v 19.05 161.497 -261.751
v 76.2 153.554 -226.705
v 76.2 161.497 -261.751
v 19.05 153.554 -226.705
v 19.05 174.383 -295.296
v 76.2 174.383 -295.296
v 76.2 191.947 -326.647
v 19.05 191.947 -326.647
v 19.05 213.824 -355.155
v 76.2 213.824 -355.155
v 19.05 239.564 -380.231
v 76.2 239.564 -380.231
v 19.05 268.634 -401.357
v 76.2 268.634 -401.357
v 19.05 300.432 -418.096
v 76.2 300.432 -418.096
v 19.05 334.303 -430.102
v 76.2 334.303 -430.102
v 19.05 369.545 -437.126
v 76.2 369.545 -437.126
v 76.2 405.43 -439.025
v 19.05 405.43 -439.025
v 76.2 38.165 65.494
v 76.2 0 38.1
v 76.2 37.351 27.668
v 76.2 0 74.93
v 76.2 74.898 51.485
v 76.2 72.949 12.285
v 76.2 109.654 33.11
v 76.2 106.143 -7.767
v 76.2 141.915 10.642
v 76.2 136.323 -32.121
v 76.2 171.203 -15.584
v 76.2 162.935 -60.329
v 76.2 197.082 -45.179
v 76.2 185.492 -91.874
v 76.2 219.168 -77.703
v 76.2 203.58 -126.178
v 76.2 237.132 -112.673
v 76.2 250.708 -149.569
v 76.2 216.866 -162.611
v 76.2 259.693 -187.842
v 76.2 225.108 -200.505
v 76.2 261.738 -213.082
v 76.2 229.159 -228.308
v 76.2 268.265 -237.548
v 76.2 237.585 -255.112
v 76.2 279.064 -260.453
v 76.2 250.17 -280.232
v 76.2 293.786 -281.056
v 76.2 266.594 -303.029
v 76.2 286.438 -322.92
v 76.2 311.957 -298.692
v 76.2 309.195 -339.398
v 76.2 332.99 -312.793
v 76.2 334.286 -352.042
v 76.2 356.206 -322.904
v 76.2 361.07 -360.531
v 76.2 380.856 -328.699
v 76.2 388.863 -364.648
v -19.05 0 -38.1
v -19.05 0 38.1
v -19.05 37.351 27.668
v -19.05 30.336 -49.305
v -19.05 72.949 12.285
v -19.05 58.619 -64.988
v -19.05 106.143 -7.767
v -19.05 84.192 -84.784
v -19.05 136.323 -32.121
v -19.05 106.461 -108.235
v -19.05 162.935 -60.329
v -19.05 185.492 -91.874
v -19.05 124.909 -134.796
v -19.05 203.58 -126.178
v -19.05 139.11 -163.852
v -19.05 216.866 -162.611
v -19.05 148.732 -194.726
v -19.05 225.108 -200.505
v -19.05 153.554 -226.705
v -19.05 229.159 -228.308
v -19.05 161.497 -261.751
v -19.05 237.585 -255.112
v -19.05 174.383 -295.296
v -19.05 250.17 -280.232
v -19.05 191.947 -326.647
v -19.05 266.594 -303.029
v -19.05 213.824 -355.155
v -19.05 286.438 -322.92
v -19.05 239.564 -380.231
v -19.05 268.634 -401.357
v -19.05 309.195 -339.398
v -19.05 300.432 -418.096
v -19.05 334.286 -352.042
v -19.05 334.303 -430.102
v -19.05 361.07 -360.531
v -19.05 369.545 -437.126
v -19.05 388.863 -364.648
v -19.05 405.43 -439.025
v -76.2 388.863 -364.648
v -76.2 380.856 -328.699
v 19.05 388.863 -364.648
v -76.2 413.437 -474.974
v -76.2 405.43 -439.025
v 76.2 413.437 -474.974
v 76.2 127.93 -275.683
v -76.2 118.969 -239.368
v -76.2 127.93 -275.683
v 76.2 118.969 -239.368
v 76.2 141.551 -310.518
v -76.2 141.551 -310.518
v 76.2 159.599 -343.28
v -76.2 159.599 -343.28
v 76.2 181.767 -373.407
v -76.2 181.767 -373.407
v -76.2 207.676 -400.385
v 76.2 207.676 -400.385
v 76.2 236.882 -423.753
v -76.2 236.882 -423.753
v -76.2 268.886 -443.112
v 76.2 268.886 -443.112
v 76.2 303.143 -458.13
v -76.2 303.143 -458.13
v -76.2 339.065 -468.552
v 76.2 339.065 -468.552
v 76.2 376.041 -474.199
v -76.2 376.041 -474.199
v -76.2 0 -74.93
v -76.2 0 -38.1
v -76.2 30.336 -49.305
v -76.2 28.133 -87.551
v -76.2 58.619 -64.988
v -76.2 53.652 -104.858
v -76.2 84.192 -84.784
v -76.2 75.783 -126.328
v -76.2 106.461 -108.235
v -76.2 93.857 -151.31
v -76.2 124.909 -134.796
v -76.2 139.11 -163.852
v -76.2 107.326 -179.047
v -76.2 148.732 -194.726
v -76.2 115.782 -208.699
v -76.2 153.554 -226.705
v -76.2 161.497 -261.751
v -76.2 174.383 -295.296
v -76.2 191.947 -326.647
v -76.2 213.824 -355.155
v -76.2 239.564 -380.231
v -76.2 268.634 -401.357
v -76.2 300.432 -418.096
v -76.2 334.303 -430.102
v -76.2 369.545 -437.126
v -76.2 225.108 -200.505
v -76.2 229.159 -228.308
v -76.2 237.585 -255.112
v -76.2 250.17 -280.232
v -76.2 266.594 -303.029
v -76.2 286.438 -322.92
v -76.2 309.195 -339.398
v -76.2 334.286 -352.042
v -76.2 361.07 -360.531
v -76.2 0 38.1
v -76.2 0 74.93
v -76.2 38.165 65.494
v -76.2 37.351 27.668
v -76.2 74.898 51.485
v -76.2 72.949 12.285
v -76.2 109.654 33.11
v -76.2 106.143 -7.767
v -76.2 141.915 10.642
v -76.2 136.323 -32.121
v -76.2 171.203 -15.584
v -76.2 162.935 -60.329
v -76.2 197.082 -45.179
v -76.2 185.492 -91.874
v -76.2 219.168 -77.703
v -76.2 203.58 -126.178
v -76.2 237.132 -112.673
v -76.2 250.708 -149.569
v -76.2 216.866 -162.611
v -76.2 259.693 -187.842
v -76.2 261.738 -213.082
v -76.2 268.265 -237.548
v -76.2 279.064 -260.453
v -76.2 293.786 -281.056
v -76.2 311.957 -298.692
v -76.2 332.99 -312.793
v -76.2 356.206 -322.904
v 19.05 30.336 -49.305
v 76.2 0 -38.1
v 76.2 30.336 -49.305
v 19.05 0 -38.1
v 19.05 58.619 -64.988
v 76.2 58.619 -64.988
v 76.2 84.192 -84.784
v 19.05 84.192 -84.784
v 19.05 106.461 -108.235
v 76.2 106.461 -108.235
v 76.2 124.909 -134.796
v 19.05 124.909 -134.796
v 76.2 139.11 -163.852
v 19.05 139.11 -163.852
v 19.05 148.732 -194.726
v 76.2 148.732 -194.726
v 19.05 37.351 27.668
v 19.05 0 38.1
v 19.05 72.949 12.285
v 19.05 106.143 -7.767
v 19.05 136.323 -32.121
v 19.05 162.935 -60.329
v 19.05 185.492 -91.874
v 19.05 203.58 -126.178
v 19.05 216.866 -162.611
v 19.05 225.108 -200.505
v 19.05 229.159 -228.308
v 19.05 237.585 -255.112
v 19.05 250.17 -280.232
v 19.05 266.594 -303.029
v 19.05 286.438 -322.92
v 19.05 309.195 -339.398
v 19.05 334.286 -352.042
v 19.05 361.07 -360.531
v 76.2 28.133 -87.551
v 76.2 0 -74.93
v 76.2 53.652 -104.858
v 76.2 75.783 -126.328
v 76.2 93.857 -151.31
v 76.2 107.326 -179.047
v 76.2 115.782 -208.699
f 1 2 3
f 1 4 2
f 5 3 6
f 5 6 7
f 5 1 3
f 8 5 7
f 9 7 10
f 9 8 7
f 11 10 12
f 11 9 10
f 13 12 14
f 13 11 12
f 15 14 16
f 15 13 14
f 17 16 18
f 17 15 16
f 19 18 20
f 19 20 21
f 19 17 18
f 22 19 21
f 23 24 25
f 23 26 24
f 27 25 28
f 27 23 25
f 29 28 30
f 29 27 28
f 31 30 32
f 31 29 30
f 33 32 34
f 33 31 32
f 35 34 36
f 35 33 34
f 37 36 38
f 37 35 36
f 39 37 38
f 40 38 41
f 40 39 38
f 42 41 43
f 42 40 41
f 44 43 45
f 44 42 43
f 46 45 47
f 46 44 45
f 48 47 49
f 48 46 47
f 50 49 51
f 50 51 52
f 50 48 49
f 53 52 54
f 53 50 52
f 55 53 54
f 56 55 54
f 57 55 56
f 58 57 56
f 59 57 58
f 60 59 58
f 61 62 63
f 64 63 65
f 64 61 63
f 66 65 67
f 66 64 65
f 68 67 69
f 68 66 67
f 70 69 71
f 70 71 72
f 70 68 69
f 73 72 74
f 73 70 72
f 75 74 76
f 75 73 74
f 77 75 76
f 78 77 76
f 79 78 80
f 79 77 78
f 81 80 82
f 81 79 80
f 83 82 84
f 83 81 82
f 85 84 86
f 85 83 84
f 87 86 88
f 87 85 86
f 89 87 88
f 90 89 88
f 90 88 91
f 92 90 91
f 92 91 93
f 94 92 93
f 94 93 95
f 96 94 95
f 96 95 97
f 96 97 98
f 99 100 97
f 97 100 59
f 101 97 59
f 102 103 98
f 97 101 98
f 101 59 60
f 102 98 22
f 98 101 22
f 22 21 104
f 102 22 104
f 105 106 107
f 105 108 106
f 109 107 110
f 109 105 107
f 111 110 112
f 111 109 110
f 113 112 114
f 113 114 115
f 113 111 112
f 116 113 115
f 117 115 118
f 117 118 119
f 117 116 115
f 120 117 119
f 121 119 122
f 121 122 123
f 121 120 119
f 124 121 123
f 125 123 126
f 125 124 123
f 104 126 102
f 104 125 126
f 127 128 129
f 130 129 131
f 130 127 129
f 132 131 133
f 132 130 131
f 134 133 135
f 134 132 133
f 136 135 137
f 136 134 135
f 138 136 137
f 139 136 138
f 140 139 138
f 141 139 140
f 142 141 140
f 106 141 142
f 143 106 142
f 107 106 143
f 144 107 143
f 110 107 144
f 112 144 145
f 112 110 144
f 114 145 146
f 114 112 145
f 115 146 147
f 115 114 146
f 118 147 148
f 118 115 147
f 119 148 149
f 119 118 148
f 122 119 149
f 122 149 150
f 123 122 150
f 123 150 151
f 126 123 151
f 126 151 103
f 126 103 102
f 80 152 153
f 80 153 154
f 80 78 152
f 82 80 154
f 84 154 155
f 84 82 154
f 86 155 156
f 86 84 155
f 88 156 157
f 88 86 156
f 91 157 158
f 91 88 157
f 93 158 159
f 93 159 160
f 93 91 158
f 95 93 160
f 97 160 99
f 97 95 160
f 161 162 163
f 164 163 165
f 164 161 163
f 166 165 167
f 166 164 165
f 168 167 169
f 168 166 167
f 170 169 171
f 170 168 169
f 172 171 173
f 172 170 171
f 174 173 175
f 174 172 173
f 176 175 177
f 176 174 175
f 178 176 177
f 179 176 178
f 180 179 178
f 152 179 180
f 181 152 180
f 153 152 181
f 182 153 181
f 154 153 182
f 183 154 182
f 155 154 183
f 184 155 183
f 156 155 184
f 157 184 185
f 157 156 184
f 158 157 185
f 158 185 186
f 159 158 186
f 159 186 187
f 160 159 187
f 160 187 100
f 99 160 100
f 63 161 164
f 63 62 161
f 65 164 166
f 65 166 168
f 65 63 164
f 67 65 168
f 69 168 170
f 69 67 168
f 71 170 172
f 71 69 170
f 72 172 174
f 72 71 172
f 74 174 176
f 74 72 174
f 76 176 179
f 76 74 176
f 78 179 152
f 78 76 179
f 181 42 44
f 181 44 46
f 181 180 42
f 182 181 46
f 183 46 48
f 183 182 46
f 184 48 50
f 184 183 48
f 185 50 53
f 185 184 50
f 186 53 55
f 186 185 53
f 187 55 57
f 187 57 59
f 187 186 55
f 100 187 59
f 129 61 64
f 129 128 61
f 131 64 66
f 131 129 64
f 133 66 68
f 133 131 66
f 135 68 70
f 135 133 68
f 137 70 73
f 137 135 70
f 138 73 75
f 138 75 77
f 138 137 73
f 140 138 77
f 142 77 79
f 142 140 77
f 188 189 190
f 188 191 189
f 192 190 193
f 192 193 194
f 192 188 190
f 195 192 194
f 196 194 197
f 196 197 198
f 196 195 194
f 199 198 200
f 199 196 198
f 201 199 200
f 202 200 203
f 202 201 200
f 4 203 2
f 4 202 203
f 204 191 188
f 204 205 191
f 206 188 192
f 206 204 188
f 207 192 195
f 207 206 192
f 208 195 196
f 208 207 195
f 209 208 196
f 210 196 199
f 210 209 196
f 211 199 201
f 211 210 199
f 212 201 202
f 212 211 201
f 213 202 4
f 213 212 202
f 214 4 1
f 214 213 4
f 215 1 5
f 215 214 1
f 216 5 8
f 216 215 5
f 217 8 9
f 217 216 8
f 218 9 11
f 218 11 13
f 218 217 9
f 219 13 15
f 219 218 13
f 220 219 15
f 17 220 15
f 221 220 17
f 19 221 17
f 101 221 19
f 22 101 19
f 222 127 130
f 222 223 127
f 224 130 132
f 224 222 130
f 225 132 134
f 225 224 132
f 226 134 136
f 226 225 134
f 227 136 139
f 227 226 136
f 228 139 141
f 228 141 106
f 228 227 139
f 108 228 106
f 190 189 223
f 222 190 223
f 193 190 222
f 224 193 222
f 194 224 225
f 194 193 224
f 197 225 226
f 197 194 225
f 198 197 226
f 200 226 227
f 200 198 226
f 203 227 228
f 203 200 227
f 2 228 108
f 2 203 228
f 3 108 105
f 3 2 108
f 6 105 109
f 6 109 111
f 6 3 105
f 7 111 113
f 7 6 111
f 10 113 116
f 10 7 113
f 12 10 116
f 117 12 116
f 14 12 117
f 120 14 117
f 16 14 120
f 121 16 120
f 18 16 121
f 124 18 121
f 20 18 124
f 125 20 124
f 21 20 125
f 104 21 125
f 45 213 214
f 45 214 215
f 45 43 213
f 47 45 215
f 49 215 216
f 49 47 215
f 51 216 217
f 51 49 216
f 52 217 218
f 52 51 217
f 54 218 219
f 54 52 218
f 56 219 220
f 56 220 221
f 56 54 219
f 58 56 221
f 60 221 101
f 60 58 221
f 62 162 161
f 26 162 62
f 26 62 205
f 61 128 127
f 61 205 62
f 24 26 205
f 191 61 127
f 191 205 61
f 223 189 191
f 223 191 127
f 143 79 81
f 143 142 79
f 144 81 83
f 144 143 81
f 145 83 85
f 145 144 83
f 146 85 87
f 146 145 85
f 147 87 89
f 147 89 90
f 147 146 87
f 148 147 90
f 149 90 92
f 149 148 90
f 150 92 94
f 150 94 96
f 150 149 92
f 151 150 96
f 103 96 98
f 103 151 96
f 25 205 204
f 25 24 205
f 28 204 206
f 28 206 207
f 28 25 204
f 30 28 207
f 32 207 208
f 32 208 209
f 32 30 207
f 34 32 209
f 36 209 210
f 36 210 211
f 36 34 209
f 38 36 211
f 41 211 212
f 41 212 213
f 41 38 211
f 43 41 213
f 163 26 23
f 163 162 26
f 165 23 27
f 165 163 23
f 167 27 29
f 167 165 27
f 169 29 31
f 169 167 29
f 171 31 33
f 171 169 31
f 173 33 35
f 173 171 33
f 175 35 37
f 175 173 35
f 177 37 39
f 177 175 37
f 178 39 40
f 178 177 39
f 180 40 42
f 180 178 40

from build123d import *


with BuildPart() as f2:
    # F2: sweep along a path in F1
    with BuildLine(Plane.YZ) as f2_path:
        ThreePointArc((0, 0), (128.283823392, -77.0044991359), (189.3310906342, -213.6048775888))
        ThreePointArc((189.3310906342, -213.6048775888), (257.8411517666, -346.8010377561), (397.1464335918, -401.836335659))
    # F0 (on Front) → F2 (sweep)
    with BuildSketch(Plane.XZ):
        Polygon((76.2, 74.93), (-76.2, 74.93), (-76.2, 38.1), (-19.05, 38.1), (-19.05, -38.1), (-76.2, -38.1), (-76.2, -74.93), (76.2, -74.93), (76.2, -38.1), (19.05, -38.1), (19.05, 38.1), (76.2, 38.1), align=None)
    sweep(path=f2_path.line)


solid = f2.part
